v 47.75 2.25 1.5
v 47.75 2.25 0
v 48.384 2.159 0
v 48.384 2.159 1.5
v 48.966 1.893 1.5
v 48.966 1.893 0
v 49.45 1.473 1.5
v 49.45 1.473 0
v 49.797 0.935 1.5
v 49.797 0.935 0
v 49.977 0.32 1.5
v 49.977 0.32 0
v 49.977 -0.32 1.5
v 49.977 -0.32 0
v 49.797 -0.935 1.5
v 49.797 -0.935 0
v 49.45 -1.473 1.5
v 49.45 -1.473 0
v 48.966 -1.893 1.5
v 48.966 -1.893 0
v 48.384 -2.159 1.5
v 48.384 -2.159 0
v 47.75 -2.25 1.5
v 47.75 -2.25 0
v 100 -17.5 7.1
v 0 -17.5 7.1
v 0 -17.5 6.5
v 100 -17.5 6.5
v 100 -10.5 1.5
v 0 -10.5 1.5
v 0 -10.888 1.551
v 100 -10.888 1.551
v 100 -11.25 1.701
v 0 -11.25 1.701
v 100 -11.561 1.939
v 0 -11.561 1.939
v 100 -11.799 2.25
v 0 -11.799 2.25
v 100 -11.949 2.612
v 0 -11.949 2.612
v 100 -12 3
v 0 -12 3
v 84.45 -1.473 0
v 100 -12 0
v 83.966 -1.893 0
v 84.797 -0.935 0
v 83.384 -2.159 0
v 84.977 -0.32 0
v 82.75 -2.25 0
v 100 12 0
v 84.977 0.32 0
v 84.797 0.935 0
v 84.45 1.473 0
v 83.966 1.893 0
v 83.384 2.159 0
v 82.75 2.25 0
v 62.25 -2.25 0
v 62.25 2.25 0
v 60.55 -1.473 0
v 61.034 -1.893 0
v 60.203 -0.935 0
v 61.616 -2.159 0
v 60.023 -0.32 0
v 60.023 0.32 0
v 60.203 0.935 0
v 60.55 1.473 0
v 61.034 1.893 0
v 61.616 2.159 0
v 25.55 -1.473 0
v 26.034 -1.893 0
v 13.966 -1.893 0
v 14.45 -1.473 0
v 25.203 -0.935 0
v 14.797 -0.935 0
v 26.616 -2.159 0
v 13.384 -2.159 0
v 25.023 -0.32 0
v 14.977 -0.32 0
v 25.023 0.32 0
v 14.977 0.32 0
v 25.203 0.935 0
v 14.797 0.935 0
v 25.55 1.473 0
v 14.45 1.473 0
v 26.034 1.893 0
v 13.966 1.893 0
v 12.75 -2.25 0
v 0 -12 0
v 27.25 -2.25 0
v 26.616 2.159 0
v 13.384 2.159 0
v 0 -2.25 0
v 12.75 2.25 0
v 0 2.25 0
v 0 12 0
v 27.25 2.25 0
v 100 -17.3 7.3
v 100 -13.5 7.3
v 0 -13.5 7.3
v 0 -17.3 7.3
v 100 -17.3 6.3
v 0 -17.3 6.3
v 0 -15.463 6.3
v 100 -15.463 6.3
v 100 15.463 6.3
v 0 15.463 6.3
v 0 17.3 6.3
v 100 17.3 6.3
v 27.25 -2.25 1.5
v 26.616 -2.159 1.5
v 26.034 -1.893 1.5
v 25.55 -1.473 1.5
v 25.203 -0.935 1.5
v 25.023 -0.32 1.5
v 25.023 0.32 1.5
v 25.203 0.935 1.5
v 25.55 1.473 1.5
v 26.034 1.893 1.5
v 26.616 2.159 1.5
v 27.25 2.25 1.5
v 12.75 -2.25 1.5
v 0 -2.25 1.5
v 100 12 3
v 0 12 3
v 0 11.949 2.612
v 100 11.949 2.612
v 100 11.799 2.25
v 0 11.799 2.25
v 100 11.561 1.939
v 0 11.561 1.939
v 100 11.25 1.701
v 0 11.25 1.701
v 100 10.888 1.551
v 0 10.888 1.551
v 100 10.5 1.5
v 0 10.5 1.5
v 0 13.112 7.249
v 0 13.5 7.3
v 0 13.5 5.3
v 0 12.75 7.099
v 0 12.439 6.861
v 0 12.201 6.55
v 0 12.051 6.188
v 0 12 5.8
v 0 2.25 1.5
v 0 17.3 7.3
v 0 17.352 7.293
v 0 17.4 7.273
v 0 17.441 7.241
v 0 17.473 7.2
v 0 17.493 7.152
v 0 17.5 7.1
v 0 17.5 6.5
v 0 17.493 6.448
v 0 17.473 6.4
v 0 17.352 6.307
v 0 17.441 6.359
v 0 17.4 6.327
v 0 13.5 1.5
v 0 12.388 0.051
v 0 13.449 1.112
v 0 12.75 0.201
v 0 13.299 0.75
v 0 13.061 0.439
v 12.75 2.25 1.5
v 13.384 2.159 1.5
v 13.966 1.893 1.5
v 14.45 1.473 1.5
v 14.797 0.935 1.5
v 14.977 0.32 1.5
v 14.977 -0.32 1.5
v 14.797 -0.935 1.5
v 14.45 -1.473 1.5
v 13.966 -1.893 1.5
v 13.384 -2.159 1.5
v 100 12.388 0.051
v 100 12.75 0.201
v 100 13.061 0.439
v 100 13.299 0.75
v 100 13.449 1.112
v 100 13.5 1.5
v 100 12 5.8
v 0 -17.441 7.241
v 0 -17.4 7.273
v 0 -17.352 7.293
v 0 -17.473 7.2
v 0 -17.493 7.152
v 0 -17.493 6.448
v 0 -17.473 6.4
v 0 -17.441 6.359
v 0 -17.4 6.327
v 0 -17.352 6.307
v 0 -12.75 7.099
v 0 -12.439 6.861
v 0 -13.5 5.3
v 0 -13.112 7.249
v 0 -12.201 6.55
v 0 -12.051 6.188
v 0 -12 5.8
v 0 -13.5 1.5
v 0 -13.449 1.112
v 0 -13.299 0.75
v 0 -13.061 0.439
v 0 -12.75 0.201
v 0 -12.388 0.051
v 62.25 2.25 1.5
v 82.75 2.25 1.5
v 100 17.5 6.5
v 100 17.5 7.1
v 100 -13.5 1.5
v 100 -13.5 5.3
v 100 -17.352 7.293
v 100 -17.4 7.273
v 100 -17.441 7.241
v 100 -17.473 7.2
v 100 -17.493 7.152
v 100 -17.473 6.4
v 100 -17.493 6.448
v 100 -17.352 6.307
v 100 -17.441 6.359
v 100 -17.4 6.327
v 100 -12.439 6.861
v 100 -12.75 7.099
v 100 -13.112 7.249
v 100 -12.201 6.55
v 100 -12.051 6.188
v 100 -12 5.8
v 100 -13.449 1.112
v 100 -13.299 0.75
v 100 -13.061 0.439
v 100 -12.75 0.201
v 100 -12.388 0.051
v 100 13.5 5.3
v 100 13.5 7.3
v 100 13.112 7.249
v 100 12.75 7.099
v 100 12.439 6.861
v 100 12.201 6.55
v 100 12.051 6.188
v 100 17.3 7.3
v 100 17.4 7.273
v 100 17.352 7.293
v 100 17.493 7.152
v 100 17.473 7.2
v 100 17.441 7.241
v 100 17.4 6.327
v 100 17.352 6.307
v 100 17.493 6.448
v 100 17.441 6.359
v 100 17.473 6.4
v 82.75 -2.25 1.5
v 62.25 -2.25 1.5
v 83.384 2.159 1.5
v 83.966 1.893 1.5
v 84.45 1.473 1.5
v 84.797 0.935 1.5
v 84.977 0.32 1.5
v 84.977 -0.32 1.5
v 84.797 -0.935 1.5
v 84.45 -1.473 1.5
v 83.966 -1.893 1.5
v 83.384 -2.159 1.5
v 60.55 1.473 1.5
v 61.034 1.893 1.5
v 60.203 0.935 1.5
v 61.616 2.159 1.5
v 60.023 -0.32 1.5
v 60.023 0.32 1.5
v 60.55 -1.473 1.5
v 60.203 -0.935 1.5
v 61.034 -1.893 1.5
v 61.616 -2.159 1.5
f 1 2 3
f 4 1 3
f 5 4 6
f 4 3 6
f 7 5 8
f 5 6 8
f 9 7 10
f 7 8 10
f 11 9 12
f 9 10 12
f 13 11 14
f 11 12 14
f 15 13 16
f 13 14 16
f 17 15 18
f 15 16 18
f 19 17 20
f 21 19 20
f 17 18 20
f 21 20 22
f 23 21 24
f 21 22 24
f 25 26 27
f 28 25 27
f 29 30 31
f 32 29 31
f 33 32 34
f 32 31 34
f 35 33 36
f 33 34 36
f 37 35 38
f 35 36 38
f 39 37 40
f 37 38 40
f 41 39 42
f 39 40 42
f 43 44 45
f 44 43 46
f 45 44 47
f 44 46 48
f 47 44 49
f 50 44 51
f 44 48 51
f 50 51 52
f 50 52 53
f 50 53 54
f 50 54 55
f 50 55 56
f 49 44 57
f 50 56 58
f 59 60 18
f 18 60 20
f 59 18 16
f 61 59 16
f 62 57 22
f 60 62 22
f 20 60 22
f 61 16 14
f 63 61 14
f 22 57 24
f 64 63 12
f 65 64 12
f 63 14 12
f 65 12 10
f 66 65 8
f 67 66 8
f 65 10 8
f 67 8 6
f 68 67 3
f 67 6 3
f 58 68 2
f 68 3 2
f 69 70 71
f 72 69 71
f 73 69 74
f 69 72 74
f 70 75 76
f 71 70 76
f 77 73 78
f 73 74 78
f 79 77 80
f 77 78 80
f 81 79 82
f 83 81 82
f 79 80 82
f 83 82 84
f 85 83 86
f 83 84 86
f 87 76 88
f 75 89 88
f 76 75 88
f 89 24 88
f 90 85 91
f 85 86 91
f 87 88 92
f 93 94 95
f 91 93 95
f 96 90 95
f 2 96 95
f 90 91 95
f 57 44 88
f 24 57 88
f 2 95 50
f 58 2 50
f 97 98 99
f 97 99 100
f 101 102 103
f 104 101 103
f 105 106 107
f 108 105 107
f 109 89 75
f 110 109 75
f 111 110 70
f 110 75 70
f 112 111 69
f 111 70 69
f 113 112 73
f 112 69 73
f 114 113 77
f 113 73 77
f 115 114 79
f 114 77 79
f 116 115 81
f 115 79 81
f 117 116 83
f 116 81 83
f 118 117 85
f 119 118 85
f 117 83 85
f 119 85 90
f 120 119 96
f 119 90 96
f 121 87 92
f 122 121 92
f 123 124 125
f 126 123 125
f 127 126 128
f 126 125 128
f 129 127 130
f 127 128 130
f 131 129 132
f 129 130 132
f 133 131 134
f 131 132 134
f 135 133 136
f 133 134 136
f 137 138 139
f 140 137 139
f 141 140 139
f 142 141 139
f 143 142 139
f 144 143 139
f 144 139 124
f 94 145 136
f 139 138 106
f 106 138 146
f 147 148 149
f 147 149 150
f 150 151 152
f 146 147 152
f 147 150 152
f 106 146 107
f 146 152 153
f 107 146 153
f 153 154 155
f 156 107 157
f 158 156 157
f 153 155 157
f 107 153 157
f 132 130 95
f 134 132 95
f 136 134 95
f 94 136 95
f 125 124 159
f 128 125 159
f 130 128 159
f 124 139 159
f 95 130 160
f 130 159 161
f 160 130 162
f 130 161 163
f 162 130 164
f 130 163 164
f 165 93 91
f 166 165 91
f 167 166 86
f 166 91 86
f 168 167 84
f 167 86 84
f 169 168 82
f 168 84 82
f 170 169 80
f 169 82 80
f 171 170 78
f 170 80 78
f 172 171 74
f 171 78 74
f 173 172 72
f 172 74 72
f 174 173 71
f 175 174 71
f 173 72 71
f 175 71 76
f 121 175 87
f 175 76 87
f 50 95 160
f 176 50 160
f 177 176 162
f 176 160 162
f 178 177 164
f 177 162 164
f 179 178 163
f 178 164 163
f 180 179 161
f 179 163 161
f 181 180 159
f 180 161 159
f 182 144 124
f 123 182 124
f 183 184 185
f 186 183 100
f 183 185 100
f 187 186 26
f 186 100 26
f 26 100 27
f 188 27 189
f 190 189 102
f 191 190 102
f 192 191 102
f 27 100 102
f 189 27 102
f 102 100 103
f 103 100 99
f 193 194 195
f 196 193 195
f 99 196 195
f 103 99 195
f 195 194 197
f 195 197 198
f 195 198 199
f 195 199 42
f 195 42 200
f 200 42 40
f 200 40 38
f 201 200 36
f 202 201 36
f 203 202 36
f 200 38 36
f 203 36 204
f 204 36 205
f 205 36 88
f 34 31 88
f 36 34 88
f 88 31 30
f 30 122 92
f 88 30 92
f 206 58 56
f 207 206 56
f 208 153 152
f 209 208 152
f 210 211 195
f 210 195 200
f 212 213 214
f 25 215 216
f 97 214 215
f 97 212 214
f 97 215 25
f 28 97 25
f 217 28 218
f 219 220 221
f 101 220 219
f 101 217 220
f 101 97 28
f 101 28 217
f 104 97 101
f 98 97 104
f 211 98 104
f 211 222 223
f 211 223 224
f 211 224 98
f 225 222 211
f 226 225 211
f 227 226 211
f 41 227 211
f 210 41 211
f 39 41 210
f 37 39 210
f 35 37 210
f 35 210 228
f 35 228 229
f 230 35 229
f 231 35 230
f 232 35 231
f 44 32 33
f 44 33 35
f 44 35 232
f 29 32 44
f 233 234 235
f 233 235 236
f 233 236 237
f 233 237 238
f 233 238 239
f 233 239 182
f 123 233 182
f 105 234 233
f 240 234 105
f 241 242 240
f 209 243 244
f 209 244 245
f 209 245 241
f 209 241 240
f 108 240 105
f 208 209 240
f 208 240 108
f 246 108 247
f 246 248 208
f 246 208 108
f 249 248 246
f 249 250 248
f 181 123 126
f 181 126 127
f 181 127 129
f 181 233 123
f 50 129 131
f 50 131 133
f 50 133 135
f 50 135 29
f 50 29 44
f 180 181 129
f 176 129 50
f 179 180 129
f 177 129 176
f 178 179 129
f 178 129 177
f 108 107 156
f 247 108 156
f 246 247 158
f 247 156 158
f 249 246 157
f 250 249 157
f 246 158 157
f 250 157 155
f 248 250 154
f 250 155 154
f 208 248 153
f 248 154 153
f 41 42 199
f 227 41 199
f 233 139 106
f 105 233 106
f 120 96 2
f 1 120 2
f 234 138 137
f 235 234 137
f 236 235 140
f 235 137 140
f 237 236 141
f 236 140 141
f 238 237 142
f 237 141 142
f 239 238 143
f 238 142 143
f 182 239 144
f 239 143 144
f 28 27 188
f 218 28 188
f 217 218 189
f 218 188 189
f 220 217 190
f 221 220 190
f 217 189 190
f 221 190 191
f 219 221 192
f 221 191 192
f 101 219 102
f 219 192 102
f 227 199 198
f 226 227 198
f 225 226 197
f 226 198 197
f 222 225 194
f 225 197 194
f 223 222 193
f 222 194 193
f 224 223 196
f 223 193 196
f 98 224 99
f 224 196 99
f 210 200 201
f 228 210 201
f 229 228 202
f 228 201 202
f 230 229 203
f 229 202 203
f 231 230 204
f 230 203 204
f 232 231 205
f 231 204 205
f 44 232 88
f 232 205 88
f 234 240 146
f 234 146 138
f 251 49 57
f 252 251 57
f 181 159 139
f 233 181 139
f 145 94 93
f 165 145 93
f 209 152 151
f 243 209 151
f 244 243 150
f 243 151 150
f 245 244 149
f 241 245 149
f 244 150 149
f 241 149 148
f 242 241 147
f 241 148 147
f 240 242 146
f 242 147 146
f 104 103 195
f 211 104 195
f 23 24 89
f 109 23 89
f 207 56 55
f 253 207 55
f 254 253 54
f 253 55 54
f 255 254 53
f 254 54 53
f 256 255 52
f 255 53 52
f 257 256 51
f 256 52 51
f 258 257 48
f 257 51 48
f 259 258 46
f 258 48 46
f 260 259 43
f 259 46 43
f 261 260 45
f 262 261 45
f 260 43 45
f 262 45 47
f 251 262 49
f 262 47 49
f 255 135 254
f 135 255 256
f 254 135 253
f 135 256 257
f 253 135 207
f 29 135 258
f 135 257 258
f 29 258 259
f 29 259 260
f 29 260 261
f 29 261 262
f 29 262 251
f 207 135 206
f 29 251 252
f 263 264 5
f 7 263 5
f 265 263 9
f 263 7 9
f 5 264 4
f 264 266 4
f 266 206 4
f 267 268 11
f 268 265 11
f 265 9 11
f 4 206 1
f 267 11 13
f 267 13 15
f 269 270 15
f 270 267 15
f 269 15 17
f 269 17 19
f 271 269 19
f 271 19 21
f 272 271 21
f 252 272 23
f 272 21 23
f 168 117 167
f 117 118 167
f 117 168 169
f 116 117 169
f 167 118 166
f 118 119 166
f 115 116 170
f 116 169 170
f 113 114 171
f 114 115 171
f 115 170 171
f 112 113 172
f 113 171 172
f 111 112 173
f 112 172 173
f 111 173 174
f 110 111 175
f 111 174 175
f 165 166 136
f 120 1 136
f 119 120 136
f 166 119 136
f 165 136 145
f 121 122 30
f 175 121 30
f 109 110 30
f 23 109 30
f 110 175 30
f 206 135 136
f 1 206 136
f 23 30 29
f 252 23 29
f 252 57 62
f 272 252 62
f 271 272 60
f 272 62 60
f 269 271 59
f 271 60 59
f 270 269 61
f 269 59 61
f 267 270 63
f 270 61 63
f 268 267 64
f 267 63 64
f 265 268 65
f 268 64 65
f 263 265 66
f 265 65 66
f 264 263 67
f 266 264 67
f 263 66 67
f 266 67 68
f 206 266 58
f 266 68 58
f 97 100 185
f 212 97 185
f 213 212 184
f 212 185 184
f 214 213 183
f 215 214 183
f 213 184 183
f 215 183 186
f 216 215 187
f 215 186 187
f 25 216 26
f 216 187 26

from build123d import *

# Parameters (mm, degrees)
BOSS_EXTRUDE1_DEPTH = 100
CUT_EXTRUDE1_DEPTH  = 102.78182549
LPATTERN1_COUNT     = 3
LPATTERN1_PITCH     = 35


with BuildPart() as part:
    # Sketch1 → Boss-Extrude1 (new body)
    with BuildSketch(Plane(origin=(0, 0, 0), x_dir=(0, 0, -1), z_dir=(1, 0, 0))):
        with BuildLine():
            Line((-6.5, 17.5), (-7.1, 17.5))
            ThreePointArc((-7.1, 17.5), (-7.241421356, 17.441421356), (-7.3, 17.3))
            Line((-7.3, 17.3), (-7.3, 13.5))
            ThreePointArc((-7.3, 13.5), (-6.860660172, 12.439339828), (-5.8, 12))
            Line((-5.8, 12), (-3, 12))
            ThreePointArc((-3, 12), (-1.939339828, 11.560660172), (-1.5, 10.5))
            Line((-1.5, 10.5), (-1.5, -10.5))
            ThreePointArc((-1.5, -10.5), (-1.939339828, -11.560660172), (-3, -12))
            Line((-3, -12), (-5.8, -12))
            ThreePointArc((-5.8, -12), (-6.860660172, -12.439339828), (-7.3, -13.5))
            Line((-7.3, -13.5), (-7.3, -17.3))
            ThreePointArc((-7.3, -17.3), (-7.241421356, -17.441421356), (-7.1, -17.5))
            Line((-7.1, -17.5), (-6.5, -17.5))
            ThreePointArc((-6.5, -17.5), (-6.358578644, -17.441421356), (-6.3, -17.3))
            Line((-6.3, -17.3), (-6.3, -15.462610506))
            Line((-6.3, -15.462610506), (-5.3, -13.5))
            Line((-5.3, -13.5), (-1.5, -13.5))
            ThreePointArc((-1.5, -13.5), (-0.439339828, -13.060660172), (0, -12))
            Line((0, -12), (0, 12))
            ThreePointArc((0, 12), (-0.439339828, 13.060660172), (-1.5, 13.5))
            Line((-1.5, 13.5), (-5.3, 13.5))
            Line((-5.3, 13.5), (-6.3, 15.462610506))
            Line((-6.3, 15.462610506), (-6.3, 17.3))
            ThreePointArc((-6.3, 17.3), (-6.358578644, 17.441421356), (-6.5, 17.5))
        make_face()
    extrude(amount=BOSS_EXTRUDE1_DEPTH)

    # Sketch2 → Cut-Extrude1 (cut, through all)
    with BuildSketch(Plane.XY):
        with BuildLine():
            Line((62.25, 2.25), (82.75, 2.25))
            ThreePointArc((82.75, 2.25), (85, 0), (82.75, -2.25))
            Line((82.75, -2.25), (62.25, -2.25))
            ThreePointArc((62.25, -2.25), (60, 0), (62.25, 2.25))
        make_face()
    cut_extrude1 = extrude(amount=CUT_EXTRUDE1_DEPTH, mode=Mode.SUBTRACT)

    # LPattern1: Cut-Extrude1 ×3
    with Locations(*[(-i * LPATTERN1_PITCH, 0, 0) for i in range(1, LPATTERN1_COUNT)]):
        add(cut_extrude1, mode=Mode.SUBTRACT)


solid = part.part
